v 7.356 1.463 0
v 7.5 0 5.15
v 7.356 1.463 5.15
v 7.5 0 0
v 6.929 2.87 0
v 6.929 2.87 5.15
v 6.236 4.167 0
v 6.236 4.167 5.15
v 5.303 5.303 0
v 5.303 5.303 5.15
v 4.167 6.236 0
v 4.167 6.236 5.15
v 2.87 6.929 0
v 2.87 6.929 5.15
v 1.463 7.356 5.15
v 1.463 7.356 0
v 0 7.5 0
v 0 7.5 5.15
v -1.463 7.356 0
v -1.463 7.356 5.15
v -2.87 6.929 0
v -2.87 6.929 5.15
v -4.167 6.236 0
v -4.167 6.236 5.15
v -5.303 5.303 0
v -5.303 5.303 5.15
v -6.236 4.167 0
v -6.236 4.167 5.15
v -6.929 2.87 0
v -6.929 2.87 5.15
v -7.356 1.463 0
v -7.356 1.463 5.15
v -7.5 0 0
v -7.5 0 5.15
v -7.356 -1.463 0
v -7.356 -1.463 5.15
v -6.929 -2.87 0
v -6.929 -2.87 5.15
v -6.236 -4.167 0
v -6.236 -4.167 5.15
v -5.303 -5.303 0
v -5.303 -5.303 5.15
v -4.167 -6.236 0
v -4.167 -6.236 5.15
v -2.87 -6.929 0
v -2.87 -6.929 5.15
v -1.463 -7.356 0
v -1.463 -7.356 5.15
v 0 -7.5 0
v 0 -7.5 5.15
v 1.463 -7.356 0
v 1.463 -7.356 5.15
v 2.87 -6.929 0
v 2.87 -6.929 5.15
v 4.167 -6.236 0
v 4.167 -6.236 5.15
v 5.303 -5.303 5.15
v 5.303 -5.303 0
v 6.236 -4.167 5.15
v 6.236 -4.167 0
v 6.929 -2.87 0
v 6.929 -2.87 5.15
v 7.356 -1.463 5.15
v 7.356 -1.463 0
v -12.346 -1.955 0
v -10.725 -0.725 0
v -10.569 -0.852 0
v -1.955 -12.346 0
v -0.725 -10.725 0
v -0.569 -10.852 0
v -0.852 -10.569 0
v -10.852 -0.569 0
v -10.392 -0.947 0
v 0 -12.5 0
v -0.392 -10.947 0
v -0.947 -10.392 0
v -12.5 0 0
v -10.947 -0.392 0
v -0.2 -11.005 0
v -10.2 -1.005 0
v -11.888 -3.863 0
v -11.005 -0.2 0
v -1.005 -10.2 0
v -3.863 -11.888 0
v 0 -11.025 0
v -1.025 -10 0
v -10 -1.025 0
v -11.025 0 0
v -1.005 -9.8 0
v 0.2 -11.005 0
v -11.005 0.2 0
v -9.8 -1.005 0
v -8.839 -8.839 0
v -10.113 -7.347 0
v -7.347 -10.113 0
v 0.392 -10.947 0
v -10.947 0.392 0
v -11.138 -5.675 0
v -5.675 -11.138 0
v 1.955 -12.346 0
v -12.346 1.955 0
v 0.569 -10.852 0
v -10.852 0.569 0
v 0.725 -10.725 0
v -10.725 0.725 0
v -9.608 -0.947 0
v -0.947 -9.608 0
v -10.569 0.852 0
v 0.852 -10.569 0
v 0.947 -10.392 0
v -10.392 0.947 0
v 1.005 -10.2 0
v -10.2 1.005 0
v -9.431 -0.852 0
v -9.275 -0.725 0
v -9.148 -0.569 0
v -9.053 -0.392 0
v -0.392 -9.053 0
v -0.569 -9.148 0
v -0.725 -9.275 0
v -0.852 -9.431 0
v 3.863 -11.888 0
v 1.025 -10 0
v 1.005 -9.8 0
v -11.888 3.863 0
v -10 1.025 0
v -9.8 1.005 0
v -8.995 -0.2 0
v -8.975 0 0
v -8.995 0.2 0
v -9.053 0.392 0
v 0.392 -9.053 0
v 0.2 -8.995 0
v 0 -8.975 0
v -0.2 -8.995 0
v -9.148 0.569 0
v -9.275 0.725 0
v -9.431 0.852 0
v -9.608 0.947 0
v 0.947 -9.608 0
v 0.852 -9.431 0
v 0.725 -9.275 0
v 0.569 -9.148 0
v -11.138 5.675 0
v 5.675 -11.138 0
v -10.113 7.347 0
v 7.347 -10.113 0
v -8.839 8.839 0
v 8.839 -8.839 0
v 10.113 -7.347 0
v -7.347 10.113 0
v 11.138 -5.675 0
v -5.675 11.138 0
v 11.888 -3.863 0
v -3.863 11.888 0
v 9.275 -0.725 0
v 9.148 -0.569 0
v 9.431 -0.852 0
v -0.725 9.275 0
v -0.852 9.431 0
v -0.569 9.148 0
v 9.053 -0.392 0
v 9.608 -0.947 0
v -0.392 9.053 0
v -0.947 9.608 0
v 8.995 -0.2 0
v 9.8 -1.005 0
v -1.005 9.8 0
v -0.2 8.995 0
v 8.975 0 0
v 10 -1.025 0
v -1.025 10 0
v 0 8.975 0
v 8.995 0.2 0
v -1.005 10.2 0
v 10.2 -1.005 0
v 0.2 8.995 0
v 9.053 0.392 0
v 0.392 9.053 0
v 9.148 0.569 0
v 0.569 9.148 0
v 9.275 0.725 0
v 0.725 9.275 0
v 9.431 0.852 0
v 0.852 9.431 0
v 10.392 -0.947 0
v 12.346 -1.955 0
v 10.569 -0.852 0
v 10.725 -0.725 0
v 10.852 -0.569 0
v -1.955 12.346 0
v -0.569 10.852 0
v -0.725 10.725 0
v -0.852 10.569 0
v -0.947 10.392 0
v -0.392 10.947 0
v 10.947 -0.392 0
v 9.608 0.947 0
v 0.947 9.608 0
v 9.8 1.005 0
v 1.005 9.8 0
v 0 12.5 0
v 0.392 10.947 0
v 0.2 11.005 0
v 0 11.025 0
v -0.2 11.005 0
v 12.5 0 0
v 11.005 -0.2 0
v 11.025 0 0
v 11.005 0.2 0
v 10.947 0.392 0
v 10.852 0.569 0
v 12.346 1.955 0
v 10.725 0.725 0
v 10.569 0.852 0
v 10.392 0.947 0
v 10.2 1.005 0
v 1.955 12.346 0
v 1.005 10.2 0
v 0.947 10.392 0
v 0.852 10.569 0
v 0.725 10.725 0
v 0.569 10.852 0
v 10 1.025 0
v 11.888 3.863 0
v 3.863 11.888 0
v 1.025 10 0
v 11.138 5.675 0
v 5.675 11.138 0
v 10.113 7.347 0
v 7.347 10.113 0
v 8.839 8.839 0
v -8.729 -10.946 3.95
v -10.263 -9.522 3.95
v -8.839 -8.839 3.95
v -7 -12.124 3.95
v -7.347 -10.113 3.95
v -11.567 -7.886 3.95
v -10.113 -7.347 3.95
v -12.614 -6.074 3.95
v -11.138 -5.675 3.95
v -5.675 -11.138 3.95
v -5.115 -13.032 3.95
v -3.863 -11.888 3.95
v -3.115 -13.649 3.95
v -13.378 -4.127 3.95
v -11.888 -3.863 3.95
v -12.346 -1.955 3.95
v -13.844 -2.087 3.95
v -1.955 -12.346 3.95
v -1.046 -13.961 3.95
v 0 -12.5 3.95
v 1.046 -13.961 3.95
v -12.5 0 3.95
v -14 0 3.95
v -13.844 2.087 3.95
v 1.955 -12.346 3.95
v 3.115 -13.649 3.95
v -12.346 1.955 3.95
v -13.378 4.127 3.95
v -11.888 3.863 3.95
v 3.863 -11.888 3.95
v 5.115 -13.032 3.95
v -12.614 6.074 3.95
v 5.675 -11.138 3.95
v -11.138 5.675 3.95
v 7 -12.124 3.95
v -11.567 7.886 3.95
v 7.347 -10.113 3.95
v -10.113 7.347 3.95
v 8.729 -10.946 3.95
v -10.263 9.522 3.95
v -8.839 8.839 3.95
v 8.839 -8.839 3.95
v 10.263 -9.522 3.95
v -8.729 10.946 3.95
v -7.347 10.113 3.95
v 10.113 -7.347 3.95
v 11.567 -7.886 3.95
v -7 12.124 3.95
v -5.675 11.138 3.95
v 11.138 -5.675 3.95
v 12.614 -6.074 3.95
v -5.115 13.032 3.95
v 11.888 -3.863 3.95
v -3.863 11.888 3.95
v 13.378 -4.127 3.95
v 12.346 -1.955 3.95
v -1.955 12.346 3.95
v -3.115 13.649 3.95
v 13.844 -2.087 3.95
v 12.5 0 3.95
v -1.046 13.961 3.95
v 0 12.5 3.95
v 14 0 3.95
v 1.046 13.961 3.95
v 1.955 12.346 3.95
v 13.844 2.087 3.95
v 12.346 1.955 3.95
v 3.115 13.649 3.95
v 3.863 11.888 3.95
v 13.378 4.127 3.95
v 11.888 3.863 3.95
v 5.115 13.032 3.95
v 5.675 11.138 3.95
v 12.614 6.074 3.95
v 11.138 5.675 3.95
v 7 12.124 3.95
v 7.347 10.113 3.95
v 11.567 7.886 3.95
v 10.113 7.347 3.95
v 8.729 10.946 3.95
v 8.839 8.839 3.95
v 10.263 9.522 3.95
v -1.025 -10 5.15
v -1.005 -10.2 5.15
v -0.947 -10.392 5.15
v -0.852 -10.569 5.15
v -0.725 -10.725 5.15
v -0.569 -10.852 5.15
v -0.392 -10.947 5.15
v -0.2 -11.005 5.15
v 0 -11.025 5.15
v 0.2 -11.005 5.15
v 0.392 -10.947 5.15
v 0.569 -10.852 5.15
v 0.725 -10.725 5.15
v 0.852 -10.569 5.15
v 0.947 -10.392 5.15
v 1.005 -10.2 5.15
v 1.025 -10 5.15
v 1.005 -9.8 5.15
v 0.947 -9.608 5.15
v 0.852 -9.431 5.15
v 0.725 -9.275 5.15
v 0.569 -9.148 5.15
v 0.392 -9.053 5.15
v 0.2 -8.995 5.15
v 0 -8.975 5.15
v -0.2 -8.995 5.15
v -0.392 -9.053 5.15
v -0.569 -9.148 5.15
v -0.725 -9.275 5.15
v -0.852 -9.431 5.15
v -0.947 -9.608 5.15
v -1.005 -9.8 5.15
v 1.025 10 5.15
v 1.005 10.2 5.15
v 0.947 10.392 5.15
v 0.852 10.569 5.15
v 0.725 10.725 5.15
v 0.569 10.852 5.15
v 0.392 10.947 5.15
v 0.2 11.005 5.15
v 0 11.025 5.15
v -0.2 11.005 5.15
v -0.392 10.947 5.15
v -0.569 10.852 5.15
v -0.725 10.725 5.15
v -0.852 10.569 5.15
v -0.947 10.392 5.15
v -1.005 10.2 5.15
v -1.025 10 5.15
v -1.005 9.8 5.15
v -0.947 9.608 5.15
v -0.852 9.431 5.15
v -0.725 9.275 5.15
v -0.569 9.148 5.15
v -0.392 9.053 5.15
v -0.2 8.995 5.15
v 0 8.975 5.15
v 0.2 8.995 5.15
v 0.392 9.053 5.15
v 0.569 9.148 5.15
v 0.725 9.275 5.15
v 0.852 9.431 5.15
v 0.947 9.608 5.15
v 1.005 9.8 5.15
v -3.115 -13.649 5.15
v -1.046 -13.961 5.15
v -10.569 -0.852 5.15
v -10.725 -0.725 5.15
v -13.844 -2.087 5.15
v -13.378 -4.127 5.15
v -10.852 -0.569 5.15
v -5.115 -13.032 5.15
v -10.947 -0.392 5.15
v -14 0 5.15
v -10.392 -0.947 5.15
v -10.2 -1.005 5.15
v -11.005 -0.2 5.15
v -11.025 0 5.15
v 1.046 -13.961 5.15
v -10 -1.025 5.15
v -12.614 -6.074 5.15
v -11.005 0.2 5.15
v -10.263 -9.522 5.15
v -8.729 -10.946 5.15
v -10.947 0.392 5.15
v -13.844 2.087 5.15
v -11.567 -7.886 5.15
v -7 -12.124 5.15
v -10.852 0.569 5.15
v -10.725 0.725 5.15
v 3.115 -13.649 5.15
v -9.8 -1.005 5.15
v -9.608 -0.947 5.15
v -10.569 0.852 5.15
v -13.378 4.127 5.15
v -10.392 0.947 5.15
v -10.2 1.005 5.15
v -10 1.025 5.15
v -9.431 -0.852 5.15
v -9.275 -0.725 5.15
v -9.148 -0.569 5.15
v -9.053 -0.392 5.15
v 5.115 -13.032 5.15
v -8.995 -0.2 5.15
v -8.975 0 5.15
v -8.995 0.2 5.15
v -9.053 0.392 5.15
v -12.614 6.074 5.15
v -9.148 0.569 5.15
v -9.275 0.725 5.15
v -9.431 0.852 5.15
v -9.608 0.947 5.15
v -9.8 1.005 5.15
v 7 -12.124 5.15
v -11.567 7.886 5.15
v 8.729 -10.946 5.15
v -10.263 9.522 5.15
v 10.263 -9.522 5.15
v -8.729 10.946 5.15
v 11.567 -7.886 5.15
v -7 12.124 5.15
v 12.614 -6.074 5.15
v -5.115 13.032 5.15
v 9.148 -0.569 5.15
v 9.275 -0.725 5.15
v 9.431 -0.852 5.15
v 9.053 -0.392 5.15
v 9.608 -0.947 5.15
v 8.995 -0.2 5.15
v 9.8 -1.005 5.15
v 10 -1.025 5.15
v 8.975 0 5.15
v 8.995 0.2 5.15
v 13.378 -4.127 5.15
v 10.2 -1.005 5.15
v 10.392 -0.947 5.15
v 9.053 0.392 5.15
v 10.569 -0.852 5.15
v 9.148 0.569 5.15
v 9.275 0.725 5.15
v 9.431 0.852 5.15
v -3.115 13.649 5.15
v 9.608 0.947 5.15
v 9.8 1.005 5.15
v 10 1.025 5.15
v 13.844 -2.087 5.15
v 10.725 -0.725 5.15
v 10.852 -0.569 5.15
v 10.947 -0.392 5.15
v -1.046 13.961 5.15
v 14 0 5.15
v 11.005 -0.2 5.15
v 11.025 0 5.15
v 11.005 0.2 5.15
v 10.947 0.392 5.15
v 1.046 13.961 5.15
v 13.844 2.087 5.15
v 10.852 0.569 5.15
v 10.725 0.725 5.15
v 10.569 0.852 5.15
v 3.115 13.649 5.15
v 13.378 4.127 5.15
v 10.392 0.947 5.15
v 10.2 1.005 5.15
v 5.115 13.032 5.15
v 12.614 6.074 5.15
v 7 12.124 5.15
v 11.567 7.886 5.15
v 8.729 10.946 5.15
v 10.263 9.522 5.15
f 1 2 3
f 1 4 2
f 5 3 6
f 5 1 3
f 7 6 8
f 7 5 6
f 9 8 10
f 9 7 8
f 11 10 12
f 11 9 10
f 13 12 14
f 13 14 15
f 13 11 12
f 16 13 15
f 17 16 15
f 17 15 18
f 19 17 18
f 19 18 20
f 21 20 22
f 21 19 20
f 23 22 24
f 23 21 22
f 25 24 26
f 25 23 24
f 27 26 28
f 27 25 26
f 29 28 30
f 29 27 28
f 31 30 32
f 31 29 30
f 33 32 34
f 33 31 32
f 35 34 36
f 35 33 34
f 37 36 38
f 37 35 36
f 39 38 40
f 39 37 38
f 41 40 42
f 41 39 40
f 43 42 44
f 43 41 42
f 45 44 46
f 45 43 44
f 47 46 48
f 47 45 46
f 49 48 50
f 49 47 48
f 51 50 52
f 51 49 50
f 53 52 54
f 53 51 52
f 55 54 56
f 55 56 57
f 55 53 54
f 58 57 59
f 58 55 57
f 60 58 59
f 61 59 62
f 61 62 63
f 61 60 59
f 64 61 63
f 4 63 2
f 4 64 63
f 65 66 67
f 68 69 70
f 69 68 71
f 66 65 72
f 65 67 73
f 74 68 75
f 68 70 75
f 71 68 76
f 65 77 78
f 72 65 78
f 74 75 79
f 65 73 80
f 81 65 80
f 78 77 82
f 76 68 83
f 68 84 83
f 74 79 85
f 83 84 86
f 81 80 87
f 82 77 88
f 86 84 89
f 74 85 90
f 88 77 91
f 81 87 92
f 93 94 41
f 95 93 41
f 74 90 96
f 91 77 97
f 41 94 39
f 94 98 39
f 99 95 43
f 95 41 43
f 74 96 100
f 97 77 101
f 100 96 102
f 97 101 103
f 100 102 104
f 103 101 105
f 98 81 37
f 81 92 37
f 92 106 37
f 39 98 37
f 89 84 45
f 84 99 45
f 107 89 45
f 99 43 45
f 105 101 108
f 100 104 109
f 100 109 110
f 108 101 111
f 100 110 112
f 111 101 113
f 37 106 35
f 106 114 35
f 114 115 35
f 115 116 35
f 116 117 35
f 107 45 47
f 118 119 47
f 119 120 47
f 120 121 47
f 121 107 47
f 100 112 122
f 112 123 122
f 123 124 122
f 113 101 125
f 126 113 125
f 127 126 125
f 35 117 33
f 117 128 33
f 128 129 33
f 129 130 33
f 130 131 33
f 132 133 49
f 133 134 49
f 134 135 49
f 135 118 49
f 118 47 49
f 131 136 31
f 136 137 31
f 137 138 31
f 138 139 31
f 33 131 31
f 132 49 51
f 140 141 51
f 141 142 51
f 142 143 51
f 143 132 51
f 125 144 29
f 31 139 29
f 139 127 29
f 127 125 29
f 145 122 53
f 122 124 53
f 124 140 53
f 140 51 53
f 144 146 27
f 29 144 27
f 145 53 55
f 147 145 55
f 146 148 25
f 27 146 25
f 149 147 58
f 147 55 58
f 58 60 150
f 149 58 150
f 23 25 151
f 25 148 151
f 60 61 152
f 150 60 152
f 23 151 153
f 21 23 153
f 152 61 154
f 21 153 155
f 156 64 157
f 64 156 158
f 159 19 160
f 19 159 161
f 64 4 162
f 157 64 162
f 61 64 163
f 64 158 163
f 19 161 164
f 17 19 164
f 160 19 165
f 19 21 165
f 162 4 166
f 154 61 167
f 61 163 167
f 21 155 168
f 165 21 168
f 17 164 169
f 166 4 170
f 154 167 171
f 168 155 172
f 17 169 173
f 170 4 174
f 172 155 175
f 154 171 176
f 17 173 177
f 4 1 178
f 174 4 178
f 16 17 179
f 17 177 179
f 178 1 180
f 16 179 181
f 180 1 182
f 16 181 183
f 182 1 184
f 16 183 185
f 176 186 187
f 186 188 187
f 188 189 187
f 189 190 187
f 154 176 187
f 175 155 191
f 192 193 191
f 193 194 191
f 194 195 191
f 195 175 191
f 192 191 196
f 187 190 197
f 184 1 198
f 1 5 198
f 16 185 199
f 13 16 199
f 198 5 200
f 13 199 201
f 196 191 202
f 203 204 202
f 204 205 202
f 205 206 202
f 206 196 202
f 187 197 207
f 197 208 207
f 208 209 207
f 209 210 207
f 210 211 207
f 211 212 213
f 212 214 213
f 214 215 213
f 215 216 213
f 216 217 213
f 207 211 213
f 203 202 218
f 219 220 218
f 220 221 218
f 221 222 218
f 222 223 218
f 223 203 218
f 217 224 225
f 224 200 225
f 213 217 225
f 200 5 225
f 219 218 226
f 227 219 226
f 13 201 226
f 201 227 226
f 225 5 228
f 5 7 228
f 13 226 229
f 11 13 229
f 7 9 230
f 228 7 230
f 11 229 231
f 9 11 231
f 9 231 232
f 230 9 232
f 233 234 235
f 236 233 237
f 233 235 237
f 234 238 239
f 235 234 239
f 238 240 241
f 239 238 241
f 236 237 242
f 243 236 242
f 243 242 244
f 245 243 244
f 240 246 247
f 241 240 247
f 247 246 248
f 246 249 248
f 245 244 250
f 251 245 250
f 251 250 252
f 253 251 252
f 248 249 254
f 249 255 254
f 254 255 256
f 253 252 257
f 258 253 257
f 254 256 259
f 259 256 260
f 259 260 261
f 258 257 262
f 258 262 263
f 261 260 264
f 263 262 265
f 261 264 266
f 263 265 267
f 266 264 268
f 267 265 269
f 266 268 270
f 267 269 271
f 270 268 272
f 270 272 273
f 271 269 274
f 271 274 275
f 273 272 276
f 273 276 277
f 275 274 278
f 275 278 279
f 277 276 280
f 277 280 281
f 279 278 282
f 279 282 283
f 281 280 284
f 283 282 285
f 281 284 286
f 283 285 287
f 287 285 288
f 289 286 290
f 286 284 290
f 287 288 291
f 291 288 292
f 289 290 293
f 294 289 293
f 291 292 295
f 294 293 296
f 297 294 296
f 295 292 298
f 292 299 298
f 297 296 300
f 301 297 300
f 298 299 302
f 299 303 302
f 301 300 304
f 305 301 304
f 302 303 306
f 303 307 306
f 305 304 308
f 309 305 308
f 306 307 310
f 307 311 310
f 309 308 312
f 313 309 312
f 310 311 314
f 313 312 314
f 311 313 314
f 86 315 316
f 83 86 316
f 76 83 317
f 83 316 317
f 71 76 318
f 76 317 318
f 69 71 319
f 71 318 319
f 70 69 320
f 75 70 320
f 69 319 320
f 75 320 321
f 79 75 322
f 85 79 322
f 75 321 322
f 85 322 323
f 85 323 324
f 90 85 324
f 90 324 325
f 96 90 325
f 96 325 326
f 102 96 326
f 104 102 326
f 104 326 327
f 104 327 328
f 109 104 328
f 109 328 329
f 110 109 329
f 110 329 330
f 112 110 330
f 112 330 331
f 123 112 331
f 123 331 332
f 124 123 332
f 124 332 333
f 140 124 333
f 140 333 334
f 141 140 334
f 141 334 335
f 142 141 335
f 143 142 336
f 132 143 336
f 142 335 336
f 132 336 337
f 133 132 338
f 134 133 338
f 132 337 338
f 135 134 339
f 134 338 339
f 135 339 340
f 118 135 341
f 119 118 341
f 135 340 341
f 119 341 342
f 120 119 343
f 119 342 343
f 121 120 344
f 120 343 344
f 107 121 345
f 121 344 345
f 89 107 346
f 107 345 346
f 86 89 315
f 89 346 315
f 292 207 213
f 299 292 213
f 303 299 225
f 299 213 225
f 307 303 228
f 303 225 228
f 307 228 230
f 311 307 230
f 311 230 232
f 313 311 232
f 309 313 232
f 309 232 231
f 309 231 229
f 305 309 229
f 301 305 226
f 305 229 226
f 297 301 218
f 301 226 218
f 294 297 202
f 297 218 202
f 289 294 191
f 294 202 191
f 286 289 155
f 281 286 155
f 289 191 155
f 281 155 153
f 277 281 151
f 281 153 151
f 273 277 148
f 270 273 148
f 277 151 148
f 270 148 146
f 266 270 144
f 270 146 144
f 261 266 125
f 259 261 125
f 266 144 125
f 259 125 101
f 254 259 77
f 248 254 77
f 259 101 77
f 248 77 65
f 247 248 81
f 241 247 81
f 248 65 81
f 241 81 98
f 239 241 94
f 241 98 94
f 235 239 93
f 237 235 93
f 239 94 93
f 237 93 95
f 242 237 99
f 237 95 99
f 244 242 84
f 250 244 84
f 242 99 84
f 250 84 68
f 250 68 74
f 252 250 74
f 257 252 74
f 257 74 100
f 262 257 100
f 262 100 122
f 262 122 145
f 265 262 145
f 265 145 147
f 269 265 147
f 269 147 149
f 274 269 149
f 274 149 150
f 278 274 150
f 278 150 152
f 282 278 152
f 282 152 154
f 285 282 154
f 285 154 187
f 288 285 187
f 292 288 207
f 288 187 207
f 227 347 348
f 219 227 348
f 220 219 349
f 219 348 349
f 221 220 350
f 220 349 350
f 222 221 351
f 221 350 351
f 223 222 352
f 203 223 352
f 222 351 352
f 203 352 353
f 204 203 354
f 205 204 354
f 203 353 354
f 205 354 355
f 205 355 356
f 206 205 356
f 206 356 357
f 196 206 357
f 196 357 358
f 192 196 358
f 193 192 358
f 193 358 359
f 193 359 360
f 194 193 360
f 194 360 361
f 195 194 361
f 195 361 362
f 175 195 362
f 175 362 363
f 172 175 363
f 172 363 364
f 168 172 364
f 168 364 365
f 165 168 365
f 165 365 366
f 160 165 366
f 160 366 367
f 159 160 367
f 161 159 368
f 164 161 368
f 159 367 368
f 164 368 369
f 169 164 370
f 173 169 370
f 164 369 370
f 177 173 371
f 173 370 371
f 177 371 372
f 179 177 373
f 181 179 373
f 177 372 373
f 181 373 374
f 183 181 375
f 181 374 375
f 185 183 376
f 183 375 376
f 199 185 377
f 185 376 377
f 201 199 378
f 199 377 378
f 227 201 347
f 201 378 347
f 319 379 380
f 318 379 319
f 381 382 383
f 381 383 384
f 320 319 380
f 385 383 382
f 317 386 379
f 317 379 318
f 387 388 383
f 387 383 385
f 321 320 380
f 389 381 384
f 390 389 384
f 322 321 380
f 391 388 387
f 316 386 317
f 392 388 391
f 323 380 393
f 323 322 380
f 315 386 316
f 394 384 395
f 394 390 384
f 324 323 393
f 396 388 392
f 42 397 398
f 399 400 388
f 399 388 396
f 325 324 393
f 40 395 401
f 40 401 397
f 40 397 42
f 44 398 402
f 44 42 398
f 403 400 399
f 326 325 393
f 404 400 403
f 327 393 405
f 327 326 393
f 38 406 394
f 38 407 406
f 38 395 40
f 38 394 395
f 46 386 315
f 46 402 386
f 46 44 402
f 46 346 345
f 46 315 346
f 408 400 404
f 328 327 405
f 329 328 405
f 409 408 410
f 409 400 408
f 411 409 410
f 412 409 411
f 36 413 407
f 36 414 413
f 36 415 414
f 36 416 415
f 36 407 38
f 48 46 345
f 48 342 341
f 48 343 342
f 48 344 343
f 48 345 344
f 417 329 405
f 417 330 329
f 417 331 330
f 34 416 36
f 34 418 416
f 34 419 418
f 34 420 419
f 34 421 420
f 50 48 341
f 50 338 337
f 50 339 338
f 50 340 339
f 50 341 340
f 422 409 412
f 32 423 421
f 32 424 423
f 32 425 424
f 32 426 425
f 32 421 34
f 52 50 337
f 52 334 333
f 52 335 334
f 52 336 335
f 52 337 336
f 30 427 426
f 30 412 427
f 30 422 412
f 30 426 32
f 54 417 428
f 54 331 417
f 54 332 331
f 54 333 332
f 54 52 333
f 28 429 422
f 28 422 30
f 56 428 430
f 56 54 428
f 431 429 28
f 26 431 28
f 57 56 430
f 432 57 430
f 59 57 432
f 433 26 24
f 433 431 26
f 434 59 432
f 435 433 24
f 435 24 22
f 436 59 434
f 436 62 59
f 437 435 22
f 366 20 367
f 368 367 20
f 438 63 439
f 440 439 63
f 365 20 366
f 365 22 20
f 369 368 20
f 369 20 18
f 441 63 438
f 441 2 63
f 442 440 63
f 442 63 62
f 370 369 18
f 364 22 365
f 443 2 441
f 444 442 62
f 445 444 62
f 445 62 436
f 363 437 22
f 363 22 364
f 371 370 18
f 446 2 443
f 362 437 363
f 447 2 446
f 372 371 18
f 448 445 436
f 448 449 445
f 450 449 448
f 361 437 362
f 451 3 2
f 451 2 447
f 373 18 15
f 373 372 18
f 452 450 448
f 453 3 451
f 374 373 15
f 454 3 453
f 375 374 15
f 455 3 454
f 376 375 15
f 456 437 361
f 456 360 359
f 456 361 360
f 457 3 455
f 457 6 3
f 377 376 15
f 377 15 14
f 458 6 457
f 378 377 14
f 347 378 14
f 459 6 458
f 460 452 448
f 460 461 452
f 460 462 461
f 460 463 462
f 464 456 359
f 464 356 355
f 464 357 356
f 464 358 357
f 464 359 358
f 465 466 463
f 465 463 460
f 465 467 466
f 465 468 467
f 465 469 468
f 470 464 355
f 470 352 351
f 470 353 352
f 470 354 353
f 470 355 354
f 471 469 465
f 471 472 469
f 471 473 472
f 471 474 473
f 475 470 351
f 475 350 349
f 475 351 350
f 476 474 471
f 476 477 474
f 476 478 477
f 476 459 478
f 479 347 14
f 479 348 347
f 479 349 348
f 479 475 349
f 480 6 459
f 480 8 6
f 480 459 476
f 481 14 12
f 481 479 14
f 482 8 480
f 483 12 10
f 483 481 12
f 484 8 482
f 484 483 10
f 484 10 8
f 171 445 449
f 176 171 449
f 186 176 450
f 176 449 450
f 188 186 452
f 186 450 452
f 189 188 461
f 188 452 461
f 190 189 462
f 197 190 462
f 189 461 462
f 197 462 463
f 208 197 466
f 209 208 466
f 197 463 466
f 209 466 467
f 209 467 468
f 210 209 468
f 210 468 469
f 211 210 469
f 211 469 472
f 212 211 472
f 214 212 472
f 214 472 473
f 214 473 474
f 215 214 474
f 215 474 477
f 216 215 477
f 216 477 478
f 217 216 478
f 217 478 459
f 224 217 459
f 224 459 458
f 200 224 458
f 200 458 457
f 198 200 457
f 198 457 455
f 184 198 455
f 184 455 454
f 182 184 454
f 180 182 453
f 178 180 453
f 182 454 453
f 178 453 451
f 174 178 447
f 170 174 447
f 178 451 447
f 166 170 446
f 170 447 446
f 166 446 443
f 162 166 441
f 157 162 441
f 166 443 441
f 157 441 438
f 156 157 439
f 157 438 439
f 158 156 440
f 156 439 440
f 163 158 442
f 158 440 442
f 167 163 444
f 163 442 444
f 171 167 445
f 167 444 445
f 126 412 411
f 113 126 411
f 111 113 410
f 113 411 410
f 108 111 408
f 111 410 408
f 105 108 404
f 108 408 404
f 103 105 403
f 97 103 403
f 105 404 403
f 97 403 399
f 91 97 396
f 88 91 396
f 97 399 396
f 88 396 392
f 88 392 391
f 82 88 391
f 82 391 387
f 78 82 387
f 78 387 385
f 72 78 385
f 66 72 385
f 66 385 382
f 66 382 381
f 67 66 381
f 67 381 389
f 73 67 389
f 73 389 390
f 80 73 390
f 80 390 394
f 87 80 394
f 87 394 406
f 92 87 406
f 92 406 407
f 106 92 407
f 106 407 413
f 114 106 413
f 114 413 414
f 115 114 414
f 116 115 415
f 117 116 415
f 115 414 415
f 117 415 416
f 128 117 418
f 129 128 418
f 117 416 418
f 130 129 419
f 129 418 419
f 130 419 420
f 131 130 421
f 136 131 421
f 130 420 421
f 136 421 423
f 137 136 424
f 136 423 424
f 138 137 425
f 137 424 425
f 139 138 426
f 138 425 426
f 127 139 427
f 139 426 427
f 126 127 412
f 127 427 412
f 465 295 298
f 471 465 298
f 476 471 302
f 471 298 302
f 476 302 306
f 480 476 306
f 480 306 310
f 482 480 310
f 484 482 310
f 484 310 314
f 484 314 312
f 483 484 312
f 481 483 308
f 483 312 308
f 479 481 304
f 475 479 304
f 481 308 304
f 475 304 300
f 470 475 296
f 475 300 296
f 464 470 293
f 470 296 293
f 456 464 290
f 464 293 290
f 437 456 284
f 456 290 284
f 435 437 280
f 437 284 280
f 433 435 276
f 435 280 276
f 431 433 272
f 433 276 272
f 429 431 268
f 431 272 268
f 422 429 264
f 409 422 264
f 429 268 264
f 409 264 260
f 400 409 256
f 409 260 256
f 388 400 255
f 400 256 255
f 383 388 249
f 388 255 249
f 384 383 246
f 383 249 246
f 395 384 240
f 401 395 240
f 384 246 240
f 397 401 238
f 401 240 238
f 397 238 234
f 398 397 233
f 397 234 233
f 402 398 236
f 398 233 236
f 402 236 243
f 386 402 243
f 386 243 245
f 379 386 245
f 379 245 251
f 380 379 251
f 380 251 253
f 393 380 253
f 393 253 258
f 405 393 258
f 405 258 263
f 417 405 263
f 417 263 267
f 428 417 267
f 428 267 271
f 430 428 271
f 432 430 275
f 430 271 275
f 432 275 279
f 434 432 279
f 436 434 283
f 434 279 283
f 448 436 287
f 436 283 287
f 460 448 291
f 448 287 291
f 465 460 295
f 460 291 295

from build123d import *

# Parameters (mm, degrees)
SKETCH_1_R               = 12.5
SKETCH_1_R_2             = 7.5
EXTRUDE_1_DEPTH          = 3.95
SKETCH_2_R               = 14
SKETCH_2_R_2             = 7.5
EXTRUDE_2_DEPTH          = 1.2
HOLE_WIZARD_M2_5_1_D     = 2.05
PATTERN_CIRCULAR_1_COUNT = 4


with BuildPart() as part:
    # 草图1 → 凸台-拉伸1 (new body)
    with BuildSketch(Plane.XY):
        Circle(SKETCH_1_R)
        Circle(SKETCH_1_R_2, mode=Mode.SUBTRACT)
    extrude(amount=EXTRUDE_1_DEPTH)

    # 草图2 → 凸台-拉伸2 (add)
    with BuildSketch(Plane.XY.offset(3.95)):
        Circle(SKETCH_2_R)
        Circle(SKETCH_2_R_2, mode=Mode.SUBTRACT)
    extrude(amount=EXTRUDE_2_DEPTH)

    # M2.5 螺纹孔1 (through all)
    with Locations(Plane(origin=(0, 0, 0), x_dir=(-1, 0, 0), z_dir=(0, 0, -1))):
        with Locations((0, 10)):
            hole_wizard_m2_5_1 = Hole(HOLE_WIZARD_M2_5_1_D / 2)

    # 阵列(圆周)1: M2.5 螺纹孔1 ×4 about axis
    pattern_circular_1_axis = Axis((0, 0, 0), (0, 0, 1))
    for i in range(1, PATTERN_CIRCULAR_1_COUNT):
        add(hole_wizard_m2_5_1.rotate(pattern_circular_1_axis, i * 360 / PATTERN_CIRCULAR_1_COUNT), mode=Mode.SUBTRACT)


solid = part.part
